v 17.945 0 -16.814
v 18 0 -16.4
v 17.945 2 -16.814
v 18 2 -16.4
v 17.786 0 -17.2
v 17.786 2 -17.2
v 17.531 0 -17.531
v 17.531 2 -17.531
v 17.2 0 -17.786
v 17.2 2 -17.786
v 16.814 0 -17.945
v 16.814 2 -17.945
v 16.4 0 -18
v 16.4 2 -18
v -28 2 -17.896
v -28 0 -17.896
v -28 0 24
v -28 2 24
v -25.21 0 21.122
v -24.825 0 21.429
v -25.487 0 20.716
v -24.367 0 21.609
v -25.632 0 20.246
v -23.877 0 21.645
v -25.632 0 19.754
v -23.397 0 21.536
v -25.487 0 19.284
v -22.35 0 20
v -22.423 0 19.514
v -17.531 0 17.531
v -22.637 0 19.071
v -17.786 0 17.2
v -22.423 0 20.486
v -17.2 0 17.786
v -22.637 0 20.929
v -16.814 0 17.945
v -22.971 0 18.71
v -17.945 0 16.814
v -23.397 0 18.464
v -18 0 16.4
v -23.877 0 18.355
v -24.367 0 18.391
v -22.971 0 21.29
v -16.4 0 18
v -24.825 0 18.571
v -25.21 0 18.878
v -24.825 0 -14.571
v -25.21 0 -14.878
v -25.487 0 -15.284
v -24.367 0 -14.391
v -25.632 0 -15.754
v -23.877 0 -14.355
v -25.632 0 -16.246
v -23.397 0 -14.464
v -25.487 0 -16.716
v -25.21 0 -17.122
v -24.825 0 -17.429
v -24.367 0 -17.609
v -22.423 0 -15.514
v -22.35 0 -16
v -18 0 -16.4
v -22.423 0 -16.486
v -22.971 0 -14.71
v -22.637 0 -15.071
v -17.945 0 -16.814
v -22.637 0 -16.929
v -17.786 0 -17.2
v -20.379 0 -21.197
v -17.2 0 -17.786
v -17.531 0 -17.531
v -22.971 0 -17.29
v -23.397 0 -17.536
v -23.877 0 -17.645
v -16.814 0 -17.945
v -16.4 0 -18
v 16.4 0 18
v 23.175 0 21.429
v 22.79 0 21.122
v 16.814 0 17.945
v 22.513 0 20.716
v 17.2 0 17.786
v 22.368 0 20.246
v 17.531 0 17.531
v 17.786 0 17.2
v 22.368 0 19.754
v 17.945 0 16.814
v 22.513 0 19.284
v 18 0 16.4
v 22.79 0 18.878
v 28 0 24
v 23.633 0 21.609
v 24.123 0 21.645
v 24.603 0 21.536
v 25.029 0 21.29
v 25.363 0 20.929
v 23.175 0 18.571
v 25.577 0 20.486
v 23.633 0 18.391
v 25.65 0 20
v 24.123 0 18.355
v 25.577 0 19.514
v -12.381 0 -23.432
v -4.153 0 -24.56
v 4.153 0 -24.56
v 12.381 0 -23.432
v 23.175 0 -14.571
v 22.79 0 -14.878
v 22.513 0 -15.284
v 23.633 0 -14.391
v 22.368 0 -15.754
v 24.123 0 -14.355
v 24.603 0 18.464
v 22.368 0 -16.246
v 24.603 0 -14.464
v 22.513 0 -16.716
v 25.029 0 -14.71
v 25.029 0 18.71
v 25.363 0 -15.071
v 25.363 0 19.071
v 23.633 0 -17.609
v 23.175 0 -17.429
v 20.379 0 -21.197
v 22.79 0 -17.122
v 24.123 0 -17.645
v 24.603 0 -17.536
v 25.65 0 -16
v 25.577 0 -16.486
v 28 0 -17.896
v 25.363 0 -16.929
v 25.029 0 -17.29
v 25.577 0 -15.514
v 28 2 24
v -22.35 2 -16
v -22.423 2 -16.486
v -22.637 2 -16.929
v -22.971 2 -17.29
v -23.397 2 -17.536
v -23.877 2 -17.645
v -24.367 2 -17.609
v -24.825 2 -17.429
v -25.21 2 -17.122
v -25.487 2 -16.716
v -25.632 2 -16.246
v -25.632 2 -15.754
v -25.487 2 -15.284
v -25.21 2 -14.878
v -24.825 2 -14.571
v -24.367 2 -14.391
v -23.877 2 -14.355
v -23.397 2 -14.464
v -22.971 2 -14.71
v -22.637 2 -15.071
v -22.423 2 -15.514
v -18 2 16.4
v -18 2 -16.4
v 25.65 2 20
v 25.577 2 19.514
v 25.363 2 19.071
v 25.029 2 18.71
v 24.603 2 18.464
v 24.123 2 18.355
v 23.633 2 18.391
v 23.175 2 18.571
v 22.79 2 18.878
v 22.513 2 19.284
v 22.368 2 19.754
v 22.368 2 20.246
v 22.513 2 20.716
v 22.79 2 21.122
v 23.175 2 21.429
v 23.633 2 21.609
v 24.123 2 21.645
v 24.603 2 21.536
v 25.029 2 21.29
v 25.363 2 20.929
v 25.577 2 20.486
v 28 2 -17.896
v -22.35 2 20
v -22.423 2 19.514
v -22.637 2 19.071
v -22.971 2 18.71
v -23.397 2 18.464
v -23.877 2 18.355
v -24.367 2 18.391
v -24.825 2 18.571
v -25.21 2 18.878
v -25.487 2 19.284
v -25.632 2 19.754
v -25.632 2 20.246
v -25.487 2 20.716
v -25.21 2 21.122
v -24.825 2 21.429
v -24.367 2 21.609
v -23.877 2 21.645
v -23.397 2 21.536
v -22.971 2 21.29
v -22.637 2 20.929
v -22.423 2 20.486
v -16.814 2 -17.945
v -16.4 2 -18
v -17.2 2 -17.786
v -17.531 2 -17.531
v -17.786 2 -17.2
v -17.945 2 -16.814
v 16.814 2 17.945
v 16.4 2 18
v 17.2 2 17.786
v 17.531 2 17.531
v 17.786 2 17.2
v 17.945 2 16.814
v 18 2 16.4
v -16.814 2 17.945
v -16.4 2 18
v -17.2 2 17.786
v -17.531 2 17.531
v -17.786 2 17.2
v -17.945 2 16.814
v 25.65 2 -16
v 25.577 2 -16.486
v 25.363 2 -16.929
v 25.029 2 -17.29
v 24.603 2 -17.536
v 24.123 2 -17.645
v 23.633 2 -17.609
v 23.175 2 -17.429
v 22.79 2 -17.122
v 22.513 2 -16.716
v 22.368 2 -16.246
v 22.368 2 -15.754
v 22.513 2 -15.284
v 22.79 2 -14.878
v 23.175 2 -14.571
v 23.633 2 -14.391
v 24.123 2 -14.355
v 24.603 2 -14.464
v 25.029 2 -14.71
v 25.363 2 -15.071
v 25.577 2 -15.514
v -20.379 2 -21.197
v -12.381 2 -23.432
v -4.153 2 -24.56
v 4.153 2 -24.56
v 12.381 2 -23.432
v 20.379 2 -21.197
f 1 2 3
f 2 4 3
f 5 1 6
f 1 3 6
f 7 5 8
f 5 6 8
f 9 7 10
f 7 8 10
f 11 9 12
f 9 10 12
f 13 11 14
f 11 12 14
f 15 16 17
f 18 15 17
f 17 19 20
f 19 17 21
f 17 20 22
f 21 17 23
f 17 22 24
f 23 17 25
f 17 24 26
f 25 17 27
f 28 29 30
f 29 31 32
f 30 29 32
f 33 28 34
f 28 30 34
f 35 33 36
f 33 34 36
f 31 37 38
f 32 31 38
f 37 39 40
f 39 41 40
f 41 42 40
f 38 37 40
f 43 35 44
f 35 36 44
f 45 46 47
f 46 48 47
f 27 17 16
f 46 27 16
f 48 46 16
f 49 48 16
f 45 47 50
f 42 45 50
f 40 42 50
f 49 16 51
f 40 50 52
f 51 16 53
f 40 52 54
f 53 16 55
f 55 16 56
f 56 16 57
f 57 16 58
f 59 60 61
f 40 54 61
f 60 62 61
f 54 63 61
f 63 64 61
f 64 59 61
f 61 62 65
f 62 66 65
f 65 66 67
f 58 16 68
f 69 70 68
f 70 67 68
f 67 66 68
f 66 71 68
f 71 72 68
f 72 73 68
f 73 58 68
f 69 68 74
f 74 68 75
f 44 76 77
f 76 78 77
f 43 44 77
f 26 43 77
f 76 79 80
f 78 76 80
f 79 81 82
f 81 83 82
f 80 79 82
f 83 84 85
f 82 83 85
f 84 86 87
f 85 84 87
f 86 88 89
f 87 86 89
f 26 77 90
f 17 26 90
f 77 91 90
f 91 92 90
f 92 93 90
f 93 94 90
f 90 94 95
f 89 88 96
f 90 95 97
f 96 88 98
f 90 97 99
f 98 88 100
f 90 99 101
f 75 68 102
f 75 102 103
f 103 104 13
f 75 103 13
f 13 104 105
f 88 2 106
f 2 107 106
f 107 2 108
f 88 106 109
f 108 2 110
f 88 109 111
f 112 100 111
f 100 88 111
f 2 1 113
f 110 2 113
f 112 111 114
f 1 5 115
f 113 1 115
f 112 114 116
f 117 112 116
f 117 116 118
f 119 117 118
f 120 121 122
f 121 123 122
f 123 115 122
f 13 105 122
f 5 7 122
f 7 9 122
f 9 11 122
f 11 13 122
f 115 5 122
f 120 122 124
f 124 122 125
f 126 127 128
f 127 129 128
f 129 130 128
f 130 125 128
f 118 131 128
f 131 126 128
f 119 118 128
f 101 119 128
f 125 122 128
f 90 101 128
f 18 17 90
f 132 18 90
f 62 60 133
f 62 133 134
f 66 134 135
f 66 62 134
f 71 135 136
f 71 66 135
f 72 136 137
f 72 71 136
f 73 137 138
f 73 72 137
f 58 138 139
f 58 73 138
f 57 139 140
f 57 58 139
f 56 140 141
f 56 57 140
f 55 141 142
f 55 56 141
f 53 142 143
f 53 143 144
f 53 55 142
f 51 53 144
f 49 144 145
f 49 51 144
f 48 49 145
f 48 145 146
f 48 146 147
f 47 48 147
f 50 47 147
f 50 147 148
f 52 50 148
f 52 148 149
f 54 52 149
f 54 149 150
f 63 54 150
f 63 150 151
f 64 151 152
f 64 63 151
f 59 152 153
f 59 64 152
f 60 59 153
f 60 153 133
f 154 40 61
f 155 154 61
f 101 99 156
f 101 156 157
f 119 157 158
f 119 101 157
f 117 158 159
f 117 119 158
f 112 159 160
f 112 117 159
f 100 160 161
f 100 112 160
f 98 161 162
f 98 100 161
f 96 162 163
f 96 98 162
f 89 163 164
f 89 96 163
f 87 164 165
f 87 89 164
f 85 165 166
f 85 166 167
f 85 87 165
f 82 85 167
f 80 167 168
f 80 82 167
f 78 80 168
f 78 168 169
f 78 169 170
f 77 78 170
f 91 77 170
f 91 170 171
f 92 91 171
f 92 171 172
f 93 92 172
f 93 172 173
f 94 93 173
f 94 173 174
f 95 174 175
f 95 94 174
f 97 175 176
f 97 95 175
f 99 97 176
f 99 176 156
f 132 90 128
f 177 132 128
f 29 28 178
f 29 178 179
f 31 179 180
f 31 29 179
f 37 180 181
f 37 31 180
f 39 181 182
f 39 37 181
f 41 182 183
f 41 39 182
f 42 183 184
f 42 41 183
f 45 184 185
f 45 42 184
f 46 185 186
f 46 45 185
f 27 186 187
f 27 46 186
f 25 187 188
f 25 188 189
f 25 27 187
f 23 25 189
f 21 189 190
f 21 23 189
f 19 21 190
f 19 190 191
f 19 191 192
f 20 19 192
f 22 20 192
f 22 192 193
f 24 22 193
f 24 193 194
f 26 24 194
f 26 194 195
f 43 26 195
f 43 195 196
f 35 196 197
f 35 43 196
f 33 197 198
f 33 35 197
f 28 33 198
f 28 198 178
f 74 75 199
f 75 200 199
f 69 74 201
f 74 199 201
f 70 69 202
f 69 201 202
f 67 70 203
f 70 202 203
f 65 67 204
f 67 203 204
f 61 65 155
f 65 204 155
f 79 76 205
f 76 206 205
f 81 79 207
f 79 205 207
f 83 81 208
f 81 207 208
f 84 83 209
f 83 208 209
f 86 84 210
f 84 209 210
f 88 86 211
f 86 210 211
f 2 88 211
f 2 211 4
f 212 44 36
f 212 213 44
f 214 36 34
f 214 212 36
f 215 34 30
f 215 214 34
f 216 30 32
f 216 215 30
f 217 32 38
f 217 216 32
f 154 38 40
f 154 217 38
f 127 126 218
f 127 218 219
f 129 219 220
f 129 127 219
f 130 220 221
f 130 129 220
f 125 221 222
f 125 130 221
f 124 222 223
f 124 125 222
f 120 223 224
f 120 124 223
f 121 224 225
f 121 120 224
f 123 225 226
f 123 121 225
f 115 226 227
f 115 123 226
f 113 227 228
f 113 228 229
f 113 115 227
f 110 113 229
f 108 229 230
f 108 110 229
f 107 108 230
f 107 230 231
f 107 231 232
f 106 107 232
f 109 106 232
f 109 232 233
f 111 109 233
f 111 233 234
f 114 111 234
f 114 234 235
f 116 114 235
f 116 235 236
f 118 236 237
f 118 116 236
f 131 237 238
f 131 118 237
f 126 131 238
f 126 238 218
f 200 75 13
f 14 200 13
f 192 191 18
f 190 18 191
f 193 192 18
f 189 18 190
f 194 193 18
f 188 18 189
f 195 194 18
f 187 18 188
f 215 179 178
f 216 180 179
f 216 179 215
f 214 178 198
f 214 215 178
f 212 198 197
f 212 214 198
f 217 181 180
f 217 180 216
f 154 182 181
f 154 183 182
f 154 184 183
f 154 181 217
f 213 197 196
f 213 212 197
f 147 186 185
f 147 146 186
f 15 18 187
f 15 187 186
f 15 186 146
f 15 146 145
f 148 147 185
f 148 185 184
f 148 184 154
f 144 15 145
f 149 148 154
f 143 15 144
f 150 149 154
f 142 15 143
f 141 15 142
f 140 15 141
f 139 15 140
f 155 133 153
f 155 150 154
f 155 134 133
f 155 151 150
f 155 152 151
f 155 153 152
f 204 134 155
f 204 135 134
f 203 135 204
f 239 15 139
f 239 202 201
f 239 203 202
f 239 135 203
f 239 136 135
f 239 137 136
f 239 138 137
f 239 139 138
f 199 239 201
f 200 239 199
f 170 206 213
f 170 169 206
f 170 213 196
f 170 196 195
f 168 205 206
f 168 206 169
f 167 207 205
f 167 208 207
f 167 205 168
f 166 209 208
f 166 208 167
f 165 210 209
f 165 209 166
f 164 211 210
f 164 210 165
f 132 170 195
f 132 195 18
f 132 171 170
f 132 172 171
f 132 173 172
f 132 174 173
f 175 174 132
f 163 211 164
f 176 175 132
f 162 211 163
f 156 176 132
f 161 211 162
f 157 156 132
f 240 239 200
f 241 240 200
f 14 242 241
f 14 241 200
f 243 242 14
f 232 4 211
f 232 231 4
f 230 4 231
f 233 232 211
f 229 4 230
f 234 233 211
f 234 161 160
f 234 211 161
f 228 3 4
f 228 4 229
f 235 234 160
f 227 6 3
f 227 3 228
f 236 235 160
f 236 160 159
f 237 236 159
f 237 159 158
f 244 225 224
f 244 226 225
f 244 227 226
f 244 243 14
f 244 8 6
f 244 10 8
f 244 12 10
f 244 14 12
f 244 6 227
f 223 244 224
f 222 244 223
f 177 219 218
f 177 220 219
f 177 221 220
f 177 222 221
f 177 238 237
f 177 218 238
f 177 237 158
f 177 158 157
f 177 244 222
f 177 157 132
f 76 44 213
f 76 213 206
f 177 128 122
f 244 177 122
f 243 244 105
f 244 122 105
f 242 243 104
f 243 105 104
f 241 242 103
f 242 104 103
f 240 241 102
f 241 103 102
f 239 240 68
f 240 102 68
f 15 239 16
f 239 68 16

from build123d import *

# Parameters (mm, degrees)
SKETCH1_R           = 1.65
SKETCH1_W           = 36
SKETCH1_H           = 36
BOSS_EXTRUDE1_DEPTH = 2
FILLET1_R           = 1.6


with BuildPart() as part:
    # Sketch1 → Boss-Extrude1 (new body)
    with BuildSketch(Plane(origin=(0, 0, 0), x_dir=(1, 0, 0), z_dir=(0, 1, 0))):
        with BuildLine():
            Line((-28, -24), (28, -24))
            Line((28, -24), (28, 17.89570392))
            ThreePointArc((28, 17.89570392), (0, 24.701428863), (-28, 17.89570392))
            Line((-28, 17.89570392), (-28, -24))
        make_face()
        with Locations((-24, 16)):
            Circle(SKETCH1_R, mode=Mode.SUBTRACT)
        with Locations((-24, -20)):
            Circle(SKETCH1_R, mode=Mode.SUBTRACT)
        with Locations((24, 16)):
            Circle(SKETCH1_R, mode=Mode.SUBTRACT)
        with Locations((24, -20)):
            Circle(SKETCH1_R, mode=Mode.SUBTRACT)
        Rectangle(SKETCH1_W, SKETCH1_H, mode=Mode.SUBTRACT)
    extrude(amount=BOSS_EXTRUDE1_DEPTH)

    # Fillet1
    fillet1_edges = [part.edges().sort_by_distance(p)[0] for p in [
        (18, 1, -18),
        (-18, 1, -18),
        (-18, 1, 18),
        (18, 1, 18),
    ]]
    fillet(fillet1_edges, radius=FILLET1_R)


solid = part.part
